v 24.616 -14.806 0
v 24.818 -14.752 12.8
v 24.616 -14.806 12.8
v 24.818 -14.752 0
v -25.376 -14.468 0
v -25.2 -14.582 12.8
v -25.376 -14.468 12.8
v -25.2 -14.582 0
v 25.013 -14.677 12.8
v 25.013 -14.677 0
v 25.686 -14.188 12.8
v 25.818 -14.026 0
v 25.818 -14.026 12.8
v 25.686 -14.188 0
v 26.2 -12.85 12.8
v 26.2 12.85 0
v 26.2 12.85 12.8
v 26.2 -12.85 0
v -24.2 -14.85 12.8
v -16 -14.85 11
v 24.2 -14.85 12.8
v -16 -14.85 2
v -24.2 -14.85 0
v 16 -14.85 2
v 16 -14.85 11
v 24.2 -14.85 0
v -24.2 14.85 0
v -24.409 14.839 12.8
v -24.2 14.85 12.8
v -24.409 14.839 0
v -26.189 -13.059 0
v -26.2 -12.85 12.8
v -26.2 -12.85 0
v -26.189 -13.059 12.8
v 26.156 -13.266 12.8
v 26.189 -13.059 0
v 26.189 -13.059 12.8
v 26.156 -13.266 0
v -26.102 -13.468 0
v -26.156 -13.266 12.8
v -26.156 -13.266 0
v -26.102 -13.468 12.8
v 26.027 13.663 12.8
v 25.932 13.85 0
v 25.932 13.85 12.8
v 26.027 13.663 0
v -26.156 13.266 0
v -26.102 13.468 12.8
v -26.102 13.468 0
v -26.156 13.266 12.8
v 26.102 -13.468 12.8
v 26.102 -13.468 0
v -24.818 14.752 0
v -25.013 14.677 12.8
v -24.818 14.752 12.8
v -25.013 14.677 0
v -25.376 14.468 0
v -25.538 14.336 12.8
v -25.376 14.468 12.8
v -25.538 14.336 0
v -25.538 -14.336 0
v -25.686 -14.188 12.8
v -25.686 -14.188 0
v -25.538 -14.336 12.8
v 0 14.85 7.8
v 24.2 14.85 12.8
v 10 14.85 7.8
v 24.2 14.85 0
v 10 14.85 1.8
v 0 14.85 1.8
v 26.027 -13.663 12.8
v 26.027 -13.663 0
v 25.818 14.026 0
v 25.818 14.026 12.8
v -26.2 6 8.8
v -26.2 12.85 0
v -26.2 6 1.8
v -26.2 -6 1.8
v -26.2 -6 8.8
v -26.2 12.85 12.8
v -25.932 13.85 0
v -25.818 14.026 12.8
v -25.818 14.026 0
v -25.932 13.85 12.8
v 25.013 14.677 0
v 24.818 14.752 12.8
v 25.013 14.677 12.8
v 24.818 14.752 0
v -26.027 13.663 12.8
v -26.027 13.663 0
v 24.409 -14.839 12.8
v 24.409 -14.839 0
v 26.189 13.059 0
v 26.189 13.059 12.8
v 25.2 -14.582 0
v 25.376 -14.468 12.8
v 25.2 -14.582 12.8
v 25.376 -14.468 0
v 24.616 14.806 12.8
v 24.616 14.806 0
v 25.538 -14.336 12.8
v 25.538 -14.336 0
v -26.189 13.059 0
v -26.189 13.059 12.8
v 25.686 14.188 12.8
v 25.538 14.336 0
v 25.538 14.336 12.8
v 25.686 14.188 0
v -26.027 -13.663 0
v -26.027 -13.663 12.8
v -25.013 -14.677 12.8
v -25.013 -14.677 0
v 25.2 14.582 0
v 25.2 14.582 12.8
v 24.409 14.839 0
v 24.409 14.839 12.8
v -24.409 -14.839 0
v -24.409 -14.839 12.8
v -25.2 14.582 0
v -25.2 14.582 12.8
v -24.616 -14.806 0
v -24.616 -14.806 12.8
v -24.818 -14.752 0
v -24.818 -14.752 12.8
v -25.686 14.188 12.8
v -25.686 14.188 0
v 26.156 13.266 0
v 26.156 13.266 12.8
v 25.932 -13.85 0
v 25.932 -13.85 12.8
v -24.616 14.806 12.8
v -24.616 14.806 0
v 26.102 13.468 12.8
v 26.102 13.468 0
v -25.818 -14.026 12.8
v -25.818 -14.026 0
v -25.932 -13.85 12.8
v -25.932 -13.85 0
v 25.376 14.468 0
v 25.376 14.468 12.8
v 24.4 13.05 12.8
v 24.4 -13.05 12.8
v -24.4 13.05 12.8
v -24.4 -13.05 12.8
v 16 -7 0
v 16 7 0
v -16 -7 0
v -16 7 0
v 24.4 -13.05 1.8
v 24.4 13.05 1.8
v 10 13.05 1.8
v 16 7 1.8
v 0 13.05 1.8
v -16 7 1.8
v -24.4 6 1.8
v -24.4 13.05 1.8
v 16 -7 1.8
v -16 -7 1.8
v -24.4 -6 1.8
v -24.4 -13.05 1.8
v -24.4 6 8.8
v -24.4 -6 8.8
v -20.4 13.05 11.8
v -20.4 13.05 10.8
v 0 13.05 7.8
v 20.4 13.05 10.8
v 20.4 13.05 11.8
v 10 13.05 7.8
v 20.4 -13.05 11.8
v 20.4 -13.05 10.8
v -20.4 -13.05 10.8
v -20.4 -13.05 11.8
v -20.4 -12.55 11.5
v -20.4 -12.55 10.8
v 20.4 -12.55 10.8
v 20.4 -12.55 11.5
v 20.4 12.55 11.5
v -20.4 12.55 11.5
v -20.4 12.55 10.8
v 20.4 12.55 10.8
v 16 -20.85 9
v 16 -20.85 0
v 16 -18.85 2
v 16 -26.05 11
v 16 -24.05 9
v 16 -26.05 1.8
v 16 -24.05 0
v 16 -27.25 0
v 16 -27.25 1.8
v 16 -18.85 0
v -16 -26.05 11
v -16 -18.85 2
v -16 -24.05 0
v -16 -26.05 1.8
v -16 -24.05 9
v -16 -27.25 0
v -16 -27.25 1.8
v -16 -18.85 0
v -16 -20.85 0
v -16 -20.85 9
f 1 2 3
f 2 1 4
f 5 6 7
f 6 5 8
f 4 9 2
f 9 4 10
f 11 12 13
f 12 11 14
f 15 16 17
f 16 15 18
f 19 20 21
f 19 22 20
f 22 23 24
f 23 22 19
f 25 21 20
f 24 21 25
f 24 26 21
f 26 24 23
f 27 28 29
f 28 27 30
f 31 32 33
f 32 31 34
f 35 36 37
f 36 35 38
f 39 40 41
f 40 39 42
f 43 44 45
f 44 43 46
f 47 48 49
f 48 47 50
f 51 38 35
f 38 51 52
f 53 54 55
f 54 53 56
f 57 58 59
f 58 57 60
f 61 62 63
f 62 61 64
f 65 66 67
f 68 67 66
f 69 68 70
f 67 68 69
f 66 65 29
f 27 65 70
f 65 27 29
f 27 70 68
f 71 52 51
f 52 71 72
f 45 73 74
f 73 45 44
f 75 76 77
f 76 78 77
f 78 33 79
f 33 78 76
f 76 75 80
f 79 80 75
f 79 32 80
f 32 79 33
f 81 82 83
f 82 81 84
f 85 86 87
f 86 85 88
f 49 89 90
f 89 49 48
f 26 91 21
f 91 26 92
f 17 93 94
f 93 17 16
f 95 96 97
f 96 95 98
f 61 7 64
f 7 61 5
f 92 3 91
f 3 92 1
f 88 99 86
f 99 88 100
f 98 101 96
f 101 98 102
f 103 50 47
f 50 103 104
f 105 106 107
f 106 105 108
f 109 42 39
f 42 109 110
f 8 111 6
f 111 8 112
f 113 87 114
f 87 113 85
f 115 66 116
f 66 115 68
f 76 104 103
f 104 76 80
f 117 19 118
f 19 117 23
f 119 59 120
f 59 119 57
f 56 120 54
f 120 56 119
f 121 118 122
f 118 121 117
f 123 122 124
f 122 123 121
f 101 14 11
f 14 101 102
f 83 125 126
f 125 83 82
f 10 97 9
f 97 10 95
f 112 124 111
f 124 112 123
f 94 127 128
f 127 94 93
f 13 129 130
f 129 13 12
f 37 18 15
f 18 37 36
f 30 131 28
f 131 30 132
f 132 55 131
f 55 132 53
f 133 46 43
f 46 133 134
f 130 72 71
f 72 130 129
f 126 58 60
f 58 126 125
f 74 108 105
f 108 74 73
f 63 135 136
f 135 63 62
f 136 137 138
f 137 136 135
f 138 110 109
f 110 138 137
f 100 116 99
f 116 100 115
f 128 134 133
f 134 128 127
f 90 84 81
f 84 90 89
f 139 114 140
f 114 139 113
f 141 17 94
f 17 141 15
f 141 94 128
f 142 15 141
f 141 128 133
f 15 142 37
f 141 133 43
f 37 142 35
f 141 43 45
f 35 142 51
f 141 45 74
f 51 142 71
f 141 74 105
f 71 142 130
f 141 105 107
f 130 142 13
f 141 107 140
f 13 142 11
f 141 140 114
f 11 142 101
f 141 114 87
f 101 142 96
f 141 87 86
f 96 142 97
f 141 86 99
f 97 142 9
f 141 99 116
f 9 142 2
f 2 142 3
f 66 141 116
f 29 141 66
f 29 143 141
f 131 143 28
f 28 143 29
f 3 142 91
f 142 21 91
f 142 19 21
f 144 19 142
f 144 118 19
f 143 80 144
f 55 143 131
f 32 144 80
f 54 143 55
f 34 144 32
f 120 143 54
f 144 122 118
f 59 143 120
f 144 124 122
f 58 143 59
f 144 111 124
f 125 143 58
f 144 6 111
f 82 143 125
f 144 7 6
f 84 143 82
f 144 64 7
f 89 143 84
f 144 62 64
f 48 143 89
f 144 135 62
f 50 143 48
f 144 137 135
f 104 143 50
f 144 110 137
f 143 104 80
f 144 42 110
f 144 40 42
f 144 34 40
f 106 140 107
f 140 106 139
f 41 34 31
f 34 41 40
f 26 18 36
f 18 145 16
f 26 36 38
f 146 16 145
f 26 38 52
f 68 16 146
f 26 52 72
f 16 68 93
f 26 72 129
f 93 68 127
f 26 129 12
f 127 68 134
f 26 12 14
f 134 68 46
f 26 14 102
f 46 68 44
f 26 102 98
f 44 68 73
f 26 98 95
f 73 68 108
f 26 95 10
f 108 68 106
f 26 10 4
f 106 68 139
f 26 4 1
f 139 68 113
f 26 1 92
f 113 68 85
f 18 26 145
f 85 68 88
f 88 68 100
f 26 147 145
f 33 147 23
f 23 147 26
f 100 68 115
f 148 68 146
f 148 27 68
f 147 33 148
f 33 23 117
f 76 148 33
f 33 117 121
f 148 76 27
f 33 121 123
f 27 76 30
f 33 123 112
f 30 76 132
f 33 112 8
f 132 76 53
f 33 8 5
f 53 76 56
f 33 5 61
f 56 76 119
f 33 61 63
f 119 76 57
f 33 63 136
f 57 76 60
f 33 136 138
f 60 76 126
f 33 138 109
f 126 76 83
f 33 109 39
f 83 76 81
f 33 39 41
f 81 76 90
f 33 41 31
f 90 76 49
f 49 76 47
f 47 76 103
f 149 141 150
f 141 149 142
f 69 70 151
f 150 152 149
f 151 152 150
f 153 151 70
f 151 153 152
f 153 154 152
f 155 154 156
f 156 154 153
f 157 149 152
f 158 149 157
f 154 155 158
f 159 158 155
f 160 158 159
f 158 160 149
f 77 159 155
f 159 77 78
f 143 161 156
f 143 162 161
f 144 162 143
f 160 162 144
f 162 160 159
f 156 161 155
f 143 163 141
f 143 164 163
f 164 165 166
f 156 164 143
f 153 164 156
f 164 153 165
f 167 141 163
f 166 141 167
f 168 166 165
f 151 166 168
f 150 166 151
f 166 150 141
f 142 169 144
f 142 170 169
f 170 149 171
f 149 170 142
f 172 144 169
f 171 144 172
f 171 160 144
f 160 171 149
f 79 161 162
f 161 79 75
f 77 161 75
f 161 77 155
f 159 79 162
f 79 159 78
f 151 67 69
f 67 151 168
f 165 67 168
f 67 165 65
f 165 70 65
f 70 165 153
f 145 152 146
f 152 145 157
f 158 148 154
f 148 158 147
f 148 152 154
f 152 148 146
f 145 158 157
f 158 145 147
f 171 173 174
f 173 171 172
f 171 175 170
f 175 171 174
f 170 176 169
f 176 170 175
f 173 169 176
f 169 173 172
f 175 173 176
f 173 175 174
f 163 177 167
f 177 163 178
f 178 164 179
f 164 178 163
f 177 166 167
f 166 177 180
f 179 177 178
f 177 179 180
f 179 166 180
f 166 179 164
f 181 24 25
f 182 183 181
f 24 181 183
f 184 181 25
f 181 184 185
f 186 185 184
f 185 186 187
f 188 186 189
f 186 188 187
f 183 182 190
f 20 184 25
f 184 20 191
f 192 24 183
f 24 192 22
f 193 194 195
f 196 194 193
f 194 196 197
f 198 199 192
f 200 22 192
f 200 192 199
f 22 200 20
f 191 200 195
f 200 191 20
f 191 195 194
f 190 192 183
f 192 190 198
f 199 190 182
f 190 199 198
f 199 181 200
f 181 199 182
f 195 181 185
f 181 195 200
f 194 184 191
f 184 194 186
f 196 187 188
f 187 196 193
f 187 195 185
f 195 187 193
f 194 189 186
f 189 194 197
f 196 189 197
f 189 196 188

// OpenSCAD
// =============================================================================
// CogniLink Assistive Technology - Eyeglass Temple Clip Cradle (Standalone)
// =============================================================================
// Dedicated parametric OpenSCAD model for the spectacle temple arm clip.
// Designed for users with high cervical spinal cord injury (C3-C5 tetraplegia)
// who retain voluntary head movement.
//
// Aligns sensor pitch with cervical nodding and roll with lateral head tilt.
// =============================================================================

/* [Eyeglass Clip Parameters] */
// Thickness of the spectacle frame temple arm (mm) - standard frames = 2.5 to 5.0 mm
TEMPLE_THICKNESS = 3.2;

// Internal clearance for M5StickC snap fit (mm)
TOLERANCE = 0.30;

// Gripping jaw height (mm)
CLIP_HEIGHT = 9.0;

// Resolution
$fn = 60;

// Dimensions
MODULE_LENGTH = 48.2;
MODULE_WIDTH  = 25.5;
WALL_THICKNESS = 1.8;
BASE_THICKNESS = 1.8;
POCKET_DEPTH = 11.0;
SNAP_LIP_DEPTH = 0.50;

cav_l = MODULE_LENGTH + 2 * TOLERANCE;
cav_w = MODULE_WIDTH  + 2 * TOLERANCE;
out_l = cav_l + 2 * WALL_THICKNESS;
out_w = cav_w + 2 * WALL_THICKNESS;
tot_h = BASE_THICKNESS + POCKET_DEPTH;

module eyeglass_temple_cradle() {
    difference() {
        hull() {
            r_c = 2.0;
            translate([-out_l/2 + r_c, -out_w/2 + r_c, 0]) cylinder(r=r_c, h=tot_h);
            translate([ out_l/2 - r_c, -out_w/2 + r_c, 0]) cylinder(r=r_c, h=tot_h);
            translate([-out_l/2 + r_c,  out_w/2 - r_c, 0]) cylinder(r=r_c, h=tot_h);
            translate([ out_l/2 - r_c,  out_w/2 - r_c, 0]) cylinder(r=r_c, h=tot_h);
        }

        translate([-cav_l/2, -cav_w/2, BASE_THICKNESS])
            cube([cav_l, cav_w, POCKET_DEPTH + 1.0]);

        translate([-out_l/2 - 0.5, -6.0, BASE_THICKNESS])
            cube([WALL_THICKNESS + 1.0, 12.0, 7.0]);

        translate([0.0, cav_w/2 - 0.5, BASE_THICKNESS])
            cube([10.0, WALL_THICKNESS + 1.0, 6.0]);

        translate([-16.0, -7.0, -0.5])
            cube([32.0, 14.0, BASE_THICKNESS + 1.0]);
    }

    // Top snap-fit retention lips (+/- Y)
    translate([-cav_l/2 + 4.0, -cav_w/2, tot_h - 1.0])
        rotate([0, 90, 0])
        linear_extrude(cav_l - 8.0)
        polygon(points=[[0, 0], [1.0, 0], [1.0, SNAP_LIP_DEPTH], [0.3, SNAP_LIP_DEPTH]]);

    translate([-cav_l/2 + 4.0, cav_w/2, tot_h - 1.0])
        rotate([0, 90, 0])
        linear_extrude(cav_l - 8.0)
        polygon(points=[[0, 0], [1.0, 0], [1.0, -SNAP_LIP_DEPTH], [0.3, -SNAP_LIP_DEPTH]]);

    // Eyeglass temple clip
    clip_len = 32.0;
    clip_gap = TEMPLE_THICKNESS;
    jaw_th = 2.0;
    clip_depth = CLIP_HEIGHT;
    bridge_w = 4.0;

    translate([-clip_len/2, -out_w/2 - bridge_w, 2.0])
        cube([clip_len, bridge_w, clip_depth]);

    y_inner = -out_w/2 - bridge_w;
    translate([-clip_len/2, y_inner - jaw_th, 0])
        cube([clip_len, jaw_th, clip_depth + 2.0]);
    translate([-clip_len/2, y_inner - jaw_th - clip_gap - jaw_th, clip_depth])
        cube([clip_len, clip_gap + 2*jaw_th, 2.0]);
    translate([-clip_len/2, y_inner - 2*jaw_th - clip_gap, 0])
        cube([clip_len, jaw_th, clip_depth + 2.0]);
    translate([-clip_len/2, y_inner - 2*jaw_th - clip_gap - 1.2, 0])
        cube([clip_len, 1.2, 1.8]);
}

// Render model
color([0.85, 0.35, 0.55])
    eyeglass_temple_cradle();
